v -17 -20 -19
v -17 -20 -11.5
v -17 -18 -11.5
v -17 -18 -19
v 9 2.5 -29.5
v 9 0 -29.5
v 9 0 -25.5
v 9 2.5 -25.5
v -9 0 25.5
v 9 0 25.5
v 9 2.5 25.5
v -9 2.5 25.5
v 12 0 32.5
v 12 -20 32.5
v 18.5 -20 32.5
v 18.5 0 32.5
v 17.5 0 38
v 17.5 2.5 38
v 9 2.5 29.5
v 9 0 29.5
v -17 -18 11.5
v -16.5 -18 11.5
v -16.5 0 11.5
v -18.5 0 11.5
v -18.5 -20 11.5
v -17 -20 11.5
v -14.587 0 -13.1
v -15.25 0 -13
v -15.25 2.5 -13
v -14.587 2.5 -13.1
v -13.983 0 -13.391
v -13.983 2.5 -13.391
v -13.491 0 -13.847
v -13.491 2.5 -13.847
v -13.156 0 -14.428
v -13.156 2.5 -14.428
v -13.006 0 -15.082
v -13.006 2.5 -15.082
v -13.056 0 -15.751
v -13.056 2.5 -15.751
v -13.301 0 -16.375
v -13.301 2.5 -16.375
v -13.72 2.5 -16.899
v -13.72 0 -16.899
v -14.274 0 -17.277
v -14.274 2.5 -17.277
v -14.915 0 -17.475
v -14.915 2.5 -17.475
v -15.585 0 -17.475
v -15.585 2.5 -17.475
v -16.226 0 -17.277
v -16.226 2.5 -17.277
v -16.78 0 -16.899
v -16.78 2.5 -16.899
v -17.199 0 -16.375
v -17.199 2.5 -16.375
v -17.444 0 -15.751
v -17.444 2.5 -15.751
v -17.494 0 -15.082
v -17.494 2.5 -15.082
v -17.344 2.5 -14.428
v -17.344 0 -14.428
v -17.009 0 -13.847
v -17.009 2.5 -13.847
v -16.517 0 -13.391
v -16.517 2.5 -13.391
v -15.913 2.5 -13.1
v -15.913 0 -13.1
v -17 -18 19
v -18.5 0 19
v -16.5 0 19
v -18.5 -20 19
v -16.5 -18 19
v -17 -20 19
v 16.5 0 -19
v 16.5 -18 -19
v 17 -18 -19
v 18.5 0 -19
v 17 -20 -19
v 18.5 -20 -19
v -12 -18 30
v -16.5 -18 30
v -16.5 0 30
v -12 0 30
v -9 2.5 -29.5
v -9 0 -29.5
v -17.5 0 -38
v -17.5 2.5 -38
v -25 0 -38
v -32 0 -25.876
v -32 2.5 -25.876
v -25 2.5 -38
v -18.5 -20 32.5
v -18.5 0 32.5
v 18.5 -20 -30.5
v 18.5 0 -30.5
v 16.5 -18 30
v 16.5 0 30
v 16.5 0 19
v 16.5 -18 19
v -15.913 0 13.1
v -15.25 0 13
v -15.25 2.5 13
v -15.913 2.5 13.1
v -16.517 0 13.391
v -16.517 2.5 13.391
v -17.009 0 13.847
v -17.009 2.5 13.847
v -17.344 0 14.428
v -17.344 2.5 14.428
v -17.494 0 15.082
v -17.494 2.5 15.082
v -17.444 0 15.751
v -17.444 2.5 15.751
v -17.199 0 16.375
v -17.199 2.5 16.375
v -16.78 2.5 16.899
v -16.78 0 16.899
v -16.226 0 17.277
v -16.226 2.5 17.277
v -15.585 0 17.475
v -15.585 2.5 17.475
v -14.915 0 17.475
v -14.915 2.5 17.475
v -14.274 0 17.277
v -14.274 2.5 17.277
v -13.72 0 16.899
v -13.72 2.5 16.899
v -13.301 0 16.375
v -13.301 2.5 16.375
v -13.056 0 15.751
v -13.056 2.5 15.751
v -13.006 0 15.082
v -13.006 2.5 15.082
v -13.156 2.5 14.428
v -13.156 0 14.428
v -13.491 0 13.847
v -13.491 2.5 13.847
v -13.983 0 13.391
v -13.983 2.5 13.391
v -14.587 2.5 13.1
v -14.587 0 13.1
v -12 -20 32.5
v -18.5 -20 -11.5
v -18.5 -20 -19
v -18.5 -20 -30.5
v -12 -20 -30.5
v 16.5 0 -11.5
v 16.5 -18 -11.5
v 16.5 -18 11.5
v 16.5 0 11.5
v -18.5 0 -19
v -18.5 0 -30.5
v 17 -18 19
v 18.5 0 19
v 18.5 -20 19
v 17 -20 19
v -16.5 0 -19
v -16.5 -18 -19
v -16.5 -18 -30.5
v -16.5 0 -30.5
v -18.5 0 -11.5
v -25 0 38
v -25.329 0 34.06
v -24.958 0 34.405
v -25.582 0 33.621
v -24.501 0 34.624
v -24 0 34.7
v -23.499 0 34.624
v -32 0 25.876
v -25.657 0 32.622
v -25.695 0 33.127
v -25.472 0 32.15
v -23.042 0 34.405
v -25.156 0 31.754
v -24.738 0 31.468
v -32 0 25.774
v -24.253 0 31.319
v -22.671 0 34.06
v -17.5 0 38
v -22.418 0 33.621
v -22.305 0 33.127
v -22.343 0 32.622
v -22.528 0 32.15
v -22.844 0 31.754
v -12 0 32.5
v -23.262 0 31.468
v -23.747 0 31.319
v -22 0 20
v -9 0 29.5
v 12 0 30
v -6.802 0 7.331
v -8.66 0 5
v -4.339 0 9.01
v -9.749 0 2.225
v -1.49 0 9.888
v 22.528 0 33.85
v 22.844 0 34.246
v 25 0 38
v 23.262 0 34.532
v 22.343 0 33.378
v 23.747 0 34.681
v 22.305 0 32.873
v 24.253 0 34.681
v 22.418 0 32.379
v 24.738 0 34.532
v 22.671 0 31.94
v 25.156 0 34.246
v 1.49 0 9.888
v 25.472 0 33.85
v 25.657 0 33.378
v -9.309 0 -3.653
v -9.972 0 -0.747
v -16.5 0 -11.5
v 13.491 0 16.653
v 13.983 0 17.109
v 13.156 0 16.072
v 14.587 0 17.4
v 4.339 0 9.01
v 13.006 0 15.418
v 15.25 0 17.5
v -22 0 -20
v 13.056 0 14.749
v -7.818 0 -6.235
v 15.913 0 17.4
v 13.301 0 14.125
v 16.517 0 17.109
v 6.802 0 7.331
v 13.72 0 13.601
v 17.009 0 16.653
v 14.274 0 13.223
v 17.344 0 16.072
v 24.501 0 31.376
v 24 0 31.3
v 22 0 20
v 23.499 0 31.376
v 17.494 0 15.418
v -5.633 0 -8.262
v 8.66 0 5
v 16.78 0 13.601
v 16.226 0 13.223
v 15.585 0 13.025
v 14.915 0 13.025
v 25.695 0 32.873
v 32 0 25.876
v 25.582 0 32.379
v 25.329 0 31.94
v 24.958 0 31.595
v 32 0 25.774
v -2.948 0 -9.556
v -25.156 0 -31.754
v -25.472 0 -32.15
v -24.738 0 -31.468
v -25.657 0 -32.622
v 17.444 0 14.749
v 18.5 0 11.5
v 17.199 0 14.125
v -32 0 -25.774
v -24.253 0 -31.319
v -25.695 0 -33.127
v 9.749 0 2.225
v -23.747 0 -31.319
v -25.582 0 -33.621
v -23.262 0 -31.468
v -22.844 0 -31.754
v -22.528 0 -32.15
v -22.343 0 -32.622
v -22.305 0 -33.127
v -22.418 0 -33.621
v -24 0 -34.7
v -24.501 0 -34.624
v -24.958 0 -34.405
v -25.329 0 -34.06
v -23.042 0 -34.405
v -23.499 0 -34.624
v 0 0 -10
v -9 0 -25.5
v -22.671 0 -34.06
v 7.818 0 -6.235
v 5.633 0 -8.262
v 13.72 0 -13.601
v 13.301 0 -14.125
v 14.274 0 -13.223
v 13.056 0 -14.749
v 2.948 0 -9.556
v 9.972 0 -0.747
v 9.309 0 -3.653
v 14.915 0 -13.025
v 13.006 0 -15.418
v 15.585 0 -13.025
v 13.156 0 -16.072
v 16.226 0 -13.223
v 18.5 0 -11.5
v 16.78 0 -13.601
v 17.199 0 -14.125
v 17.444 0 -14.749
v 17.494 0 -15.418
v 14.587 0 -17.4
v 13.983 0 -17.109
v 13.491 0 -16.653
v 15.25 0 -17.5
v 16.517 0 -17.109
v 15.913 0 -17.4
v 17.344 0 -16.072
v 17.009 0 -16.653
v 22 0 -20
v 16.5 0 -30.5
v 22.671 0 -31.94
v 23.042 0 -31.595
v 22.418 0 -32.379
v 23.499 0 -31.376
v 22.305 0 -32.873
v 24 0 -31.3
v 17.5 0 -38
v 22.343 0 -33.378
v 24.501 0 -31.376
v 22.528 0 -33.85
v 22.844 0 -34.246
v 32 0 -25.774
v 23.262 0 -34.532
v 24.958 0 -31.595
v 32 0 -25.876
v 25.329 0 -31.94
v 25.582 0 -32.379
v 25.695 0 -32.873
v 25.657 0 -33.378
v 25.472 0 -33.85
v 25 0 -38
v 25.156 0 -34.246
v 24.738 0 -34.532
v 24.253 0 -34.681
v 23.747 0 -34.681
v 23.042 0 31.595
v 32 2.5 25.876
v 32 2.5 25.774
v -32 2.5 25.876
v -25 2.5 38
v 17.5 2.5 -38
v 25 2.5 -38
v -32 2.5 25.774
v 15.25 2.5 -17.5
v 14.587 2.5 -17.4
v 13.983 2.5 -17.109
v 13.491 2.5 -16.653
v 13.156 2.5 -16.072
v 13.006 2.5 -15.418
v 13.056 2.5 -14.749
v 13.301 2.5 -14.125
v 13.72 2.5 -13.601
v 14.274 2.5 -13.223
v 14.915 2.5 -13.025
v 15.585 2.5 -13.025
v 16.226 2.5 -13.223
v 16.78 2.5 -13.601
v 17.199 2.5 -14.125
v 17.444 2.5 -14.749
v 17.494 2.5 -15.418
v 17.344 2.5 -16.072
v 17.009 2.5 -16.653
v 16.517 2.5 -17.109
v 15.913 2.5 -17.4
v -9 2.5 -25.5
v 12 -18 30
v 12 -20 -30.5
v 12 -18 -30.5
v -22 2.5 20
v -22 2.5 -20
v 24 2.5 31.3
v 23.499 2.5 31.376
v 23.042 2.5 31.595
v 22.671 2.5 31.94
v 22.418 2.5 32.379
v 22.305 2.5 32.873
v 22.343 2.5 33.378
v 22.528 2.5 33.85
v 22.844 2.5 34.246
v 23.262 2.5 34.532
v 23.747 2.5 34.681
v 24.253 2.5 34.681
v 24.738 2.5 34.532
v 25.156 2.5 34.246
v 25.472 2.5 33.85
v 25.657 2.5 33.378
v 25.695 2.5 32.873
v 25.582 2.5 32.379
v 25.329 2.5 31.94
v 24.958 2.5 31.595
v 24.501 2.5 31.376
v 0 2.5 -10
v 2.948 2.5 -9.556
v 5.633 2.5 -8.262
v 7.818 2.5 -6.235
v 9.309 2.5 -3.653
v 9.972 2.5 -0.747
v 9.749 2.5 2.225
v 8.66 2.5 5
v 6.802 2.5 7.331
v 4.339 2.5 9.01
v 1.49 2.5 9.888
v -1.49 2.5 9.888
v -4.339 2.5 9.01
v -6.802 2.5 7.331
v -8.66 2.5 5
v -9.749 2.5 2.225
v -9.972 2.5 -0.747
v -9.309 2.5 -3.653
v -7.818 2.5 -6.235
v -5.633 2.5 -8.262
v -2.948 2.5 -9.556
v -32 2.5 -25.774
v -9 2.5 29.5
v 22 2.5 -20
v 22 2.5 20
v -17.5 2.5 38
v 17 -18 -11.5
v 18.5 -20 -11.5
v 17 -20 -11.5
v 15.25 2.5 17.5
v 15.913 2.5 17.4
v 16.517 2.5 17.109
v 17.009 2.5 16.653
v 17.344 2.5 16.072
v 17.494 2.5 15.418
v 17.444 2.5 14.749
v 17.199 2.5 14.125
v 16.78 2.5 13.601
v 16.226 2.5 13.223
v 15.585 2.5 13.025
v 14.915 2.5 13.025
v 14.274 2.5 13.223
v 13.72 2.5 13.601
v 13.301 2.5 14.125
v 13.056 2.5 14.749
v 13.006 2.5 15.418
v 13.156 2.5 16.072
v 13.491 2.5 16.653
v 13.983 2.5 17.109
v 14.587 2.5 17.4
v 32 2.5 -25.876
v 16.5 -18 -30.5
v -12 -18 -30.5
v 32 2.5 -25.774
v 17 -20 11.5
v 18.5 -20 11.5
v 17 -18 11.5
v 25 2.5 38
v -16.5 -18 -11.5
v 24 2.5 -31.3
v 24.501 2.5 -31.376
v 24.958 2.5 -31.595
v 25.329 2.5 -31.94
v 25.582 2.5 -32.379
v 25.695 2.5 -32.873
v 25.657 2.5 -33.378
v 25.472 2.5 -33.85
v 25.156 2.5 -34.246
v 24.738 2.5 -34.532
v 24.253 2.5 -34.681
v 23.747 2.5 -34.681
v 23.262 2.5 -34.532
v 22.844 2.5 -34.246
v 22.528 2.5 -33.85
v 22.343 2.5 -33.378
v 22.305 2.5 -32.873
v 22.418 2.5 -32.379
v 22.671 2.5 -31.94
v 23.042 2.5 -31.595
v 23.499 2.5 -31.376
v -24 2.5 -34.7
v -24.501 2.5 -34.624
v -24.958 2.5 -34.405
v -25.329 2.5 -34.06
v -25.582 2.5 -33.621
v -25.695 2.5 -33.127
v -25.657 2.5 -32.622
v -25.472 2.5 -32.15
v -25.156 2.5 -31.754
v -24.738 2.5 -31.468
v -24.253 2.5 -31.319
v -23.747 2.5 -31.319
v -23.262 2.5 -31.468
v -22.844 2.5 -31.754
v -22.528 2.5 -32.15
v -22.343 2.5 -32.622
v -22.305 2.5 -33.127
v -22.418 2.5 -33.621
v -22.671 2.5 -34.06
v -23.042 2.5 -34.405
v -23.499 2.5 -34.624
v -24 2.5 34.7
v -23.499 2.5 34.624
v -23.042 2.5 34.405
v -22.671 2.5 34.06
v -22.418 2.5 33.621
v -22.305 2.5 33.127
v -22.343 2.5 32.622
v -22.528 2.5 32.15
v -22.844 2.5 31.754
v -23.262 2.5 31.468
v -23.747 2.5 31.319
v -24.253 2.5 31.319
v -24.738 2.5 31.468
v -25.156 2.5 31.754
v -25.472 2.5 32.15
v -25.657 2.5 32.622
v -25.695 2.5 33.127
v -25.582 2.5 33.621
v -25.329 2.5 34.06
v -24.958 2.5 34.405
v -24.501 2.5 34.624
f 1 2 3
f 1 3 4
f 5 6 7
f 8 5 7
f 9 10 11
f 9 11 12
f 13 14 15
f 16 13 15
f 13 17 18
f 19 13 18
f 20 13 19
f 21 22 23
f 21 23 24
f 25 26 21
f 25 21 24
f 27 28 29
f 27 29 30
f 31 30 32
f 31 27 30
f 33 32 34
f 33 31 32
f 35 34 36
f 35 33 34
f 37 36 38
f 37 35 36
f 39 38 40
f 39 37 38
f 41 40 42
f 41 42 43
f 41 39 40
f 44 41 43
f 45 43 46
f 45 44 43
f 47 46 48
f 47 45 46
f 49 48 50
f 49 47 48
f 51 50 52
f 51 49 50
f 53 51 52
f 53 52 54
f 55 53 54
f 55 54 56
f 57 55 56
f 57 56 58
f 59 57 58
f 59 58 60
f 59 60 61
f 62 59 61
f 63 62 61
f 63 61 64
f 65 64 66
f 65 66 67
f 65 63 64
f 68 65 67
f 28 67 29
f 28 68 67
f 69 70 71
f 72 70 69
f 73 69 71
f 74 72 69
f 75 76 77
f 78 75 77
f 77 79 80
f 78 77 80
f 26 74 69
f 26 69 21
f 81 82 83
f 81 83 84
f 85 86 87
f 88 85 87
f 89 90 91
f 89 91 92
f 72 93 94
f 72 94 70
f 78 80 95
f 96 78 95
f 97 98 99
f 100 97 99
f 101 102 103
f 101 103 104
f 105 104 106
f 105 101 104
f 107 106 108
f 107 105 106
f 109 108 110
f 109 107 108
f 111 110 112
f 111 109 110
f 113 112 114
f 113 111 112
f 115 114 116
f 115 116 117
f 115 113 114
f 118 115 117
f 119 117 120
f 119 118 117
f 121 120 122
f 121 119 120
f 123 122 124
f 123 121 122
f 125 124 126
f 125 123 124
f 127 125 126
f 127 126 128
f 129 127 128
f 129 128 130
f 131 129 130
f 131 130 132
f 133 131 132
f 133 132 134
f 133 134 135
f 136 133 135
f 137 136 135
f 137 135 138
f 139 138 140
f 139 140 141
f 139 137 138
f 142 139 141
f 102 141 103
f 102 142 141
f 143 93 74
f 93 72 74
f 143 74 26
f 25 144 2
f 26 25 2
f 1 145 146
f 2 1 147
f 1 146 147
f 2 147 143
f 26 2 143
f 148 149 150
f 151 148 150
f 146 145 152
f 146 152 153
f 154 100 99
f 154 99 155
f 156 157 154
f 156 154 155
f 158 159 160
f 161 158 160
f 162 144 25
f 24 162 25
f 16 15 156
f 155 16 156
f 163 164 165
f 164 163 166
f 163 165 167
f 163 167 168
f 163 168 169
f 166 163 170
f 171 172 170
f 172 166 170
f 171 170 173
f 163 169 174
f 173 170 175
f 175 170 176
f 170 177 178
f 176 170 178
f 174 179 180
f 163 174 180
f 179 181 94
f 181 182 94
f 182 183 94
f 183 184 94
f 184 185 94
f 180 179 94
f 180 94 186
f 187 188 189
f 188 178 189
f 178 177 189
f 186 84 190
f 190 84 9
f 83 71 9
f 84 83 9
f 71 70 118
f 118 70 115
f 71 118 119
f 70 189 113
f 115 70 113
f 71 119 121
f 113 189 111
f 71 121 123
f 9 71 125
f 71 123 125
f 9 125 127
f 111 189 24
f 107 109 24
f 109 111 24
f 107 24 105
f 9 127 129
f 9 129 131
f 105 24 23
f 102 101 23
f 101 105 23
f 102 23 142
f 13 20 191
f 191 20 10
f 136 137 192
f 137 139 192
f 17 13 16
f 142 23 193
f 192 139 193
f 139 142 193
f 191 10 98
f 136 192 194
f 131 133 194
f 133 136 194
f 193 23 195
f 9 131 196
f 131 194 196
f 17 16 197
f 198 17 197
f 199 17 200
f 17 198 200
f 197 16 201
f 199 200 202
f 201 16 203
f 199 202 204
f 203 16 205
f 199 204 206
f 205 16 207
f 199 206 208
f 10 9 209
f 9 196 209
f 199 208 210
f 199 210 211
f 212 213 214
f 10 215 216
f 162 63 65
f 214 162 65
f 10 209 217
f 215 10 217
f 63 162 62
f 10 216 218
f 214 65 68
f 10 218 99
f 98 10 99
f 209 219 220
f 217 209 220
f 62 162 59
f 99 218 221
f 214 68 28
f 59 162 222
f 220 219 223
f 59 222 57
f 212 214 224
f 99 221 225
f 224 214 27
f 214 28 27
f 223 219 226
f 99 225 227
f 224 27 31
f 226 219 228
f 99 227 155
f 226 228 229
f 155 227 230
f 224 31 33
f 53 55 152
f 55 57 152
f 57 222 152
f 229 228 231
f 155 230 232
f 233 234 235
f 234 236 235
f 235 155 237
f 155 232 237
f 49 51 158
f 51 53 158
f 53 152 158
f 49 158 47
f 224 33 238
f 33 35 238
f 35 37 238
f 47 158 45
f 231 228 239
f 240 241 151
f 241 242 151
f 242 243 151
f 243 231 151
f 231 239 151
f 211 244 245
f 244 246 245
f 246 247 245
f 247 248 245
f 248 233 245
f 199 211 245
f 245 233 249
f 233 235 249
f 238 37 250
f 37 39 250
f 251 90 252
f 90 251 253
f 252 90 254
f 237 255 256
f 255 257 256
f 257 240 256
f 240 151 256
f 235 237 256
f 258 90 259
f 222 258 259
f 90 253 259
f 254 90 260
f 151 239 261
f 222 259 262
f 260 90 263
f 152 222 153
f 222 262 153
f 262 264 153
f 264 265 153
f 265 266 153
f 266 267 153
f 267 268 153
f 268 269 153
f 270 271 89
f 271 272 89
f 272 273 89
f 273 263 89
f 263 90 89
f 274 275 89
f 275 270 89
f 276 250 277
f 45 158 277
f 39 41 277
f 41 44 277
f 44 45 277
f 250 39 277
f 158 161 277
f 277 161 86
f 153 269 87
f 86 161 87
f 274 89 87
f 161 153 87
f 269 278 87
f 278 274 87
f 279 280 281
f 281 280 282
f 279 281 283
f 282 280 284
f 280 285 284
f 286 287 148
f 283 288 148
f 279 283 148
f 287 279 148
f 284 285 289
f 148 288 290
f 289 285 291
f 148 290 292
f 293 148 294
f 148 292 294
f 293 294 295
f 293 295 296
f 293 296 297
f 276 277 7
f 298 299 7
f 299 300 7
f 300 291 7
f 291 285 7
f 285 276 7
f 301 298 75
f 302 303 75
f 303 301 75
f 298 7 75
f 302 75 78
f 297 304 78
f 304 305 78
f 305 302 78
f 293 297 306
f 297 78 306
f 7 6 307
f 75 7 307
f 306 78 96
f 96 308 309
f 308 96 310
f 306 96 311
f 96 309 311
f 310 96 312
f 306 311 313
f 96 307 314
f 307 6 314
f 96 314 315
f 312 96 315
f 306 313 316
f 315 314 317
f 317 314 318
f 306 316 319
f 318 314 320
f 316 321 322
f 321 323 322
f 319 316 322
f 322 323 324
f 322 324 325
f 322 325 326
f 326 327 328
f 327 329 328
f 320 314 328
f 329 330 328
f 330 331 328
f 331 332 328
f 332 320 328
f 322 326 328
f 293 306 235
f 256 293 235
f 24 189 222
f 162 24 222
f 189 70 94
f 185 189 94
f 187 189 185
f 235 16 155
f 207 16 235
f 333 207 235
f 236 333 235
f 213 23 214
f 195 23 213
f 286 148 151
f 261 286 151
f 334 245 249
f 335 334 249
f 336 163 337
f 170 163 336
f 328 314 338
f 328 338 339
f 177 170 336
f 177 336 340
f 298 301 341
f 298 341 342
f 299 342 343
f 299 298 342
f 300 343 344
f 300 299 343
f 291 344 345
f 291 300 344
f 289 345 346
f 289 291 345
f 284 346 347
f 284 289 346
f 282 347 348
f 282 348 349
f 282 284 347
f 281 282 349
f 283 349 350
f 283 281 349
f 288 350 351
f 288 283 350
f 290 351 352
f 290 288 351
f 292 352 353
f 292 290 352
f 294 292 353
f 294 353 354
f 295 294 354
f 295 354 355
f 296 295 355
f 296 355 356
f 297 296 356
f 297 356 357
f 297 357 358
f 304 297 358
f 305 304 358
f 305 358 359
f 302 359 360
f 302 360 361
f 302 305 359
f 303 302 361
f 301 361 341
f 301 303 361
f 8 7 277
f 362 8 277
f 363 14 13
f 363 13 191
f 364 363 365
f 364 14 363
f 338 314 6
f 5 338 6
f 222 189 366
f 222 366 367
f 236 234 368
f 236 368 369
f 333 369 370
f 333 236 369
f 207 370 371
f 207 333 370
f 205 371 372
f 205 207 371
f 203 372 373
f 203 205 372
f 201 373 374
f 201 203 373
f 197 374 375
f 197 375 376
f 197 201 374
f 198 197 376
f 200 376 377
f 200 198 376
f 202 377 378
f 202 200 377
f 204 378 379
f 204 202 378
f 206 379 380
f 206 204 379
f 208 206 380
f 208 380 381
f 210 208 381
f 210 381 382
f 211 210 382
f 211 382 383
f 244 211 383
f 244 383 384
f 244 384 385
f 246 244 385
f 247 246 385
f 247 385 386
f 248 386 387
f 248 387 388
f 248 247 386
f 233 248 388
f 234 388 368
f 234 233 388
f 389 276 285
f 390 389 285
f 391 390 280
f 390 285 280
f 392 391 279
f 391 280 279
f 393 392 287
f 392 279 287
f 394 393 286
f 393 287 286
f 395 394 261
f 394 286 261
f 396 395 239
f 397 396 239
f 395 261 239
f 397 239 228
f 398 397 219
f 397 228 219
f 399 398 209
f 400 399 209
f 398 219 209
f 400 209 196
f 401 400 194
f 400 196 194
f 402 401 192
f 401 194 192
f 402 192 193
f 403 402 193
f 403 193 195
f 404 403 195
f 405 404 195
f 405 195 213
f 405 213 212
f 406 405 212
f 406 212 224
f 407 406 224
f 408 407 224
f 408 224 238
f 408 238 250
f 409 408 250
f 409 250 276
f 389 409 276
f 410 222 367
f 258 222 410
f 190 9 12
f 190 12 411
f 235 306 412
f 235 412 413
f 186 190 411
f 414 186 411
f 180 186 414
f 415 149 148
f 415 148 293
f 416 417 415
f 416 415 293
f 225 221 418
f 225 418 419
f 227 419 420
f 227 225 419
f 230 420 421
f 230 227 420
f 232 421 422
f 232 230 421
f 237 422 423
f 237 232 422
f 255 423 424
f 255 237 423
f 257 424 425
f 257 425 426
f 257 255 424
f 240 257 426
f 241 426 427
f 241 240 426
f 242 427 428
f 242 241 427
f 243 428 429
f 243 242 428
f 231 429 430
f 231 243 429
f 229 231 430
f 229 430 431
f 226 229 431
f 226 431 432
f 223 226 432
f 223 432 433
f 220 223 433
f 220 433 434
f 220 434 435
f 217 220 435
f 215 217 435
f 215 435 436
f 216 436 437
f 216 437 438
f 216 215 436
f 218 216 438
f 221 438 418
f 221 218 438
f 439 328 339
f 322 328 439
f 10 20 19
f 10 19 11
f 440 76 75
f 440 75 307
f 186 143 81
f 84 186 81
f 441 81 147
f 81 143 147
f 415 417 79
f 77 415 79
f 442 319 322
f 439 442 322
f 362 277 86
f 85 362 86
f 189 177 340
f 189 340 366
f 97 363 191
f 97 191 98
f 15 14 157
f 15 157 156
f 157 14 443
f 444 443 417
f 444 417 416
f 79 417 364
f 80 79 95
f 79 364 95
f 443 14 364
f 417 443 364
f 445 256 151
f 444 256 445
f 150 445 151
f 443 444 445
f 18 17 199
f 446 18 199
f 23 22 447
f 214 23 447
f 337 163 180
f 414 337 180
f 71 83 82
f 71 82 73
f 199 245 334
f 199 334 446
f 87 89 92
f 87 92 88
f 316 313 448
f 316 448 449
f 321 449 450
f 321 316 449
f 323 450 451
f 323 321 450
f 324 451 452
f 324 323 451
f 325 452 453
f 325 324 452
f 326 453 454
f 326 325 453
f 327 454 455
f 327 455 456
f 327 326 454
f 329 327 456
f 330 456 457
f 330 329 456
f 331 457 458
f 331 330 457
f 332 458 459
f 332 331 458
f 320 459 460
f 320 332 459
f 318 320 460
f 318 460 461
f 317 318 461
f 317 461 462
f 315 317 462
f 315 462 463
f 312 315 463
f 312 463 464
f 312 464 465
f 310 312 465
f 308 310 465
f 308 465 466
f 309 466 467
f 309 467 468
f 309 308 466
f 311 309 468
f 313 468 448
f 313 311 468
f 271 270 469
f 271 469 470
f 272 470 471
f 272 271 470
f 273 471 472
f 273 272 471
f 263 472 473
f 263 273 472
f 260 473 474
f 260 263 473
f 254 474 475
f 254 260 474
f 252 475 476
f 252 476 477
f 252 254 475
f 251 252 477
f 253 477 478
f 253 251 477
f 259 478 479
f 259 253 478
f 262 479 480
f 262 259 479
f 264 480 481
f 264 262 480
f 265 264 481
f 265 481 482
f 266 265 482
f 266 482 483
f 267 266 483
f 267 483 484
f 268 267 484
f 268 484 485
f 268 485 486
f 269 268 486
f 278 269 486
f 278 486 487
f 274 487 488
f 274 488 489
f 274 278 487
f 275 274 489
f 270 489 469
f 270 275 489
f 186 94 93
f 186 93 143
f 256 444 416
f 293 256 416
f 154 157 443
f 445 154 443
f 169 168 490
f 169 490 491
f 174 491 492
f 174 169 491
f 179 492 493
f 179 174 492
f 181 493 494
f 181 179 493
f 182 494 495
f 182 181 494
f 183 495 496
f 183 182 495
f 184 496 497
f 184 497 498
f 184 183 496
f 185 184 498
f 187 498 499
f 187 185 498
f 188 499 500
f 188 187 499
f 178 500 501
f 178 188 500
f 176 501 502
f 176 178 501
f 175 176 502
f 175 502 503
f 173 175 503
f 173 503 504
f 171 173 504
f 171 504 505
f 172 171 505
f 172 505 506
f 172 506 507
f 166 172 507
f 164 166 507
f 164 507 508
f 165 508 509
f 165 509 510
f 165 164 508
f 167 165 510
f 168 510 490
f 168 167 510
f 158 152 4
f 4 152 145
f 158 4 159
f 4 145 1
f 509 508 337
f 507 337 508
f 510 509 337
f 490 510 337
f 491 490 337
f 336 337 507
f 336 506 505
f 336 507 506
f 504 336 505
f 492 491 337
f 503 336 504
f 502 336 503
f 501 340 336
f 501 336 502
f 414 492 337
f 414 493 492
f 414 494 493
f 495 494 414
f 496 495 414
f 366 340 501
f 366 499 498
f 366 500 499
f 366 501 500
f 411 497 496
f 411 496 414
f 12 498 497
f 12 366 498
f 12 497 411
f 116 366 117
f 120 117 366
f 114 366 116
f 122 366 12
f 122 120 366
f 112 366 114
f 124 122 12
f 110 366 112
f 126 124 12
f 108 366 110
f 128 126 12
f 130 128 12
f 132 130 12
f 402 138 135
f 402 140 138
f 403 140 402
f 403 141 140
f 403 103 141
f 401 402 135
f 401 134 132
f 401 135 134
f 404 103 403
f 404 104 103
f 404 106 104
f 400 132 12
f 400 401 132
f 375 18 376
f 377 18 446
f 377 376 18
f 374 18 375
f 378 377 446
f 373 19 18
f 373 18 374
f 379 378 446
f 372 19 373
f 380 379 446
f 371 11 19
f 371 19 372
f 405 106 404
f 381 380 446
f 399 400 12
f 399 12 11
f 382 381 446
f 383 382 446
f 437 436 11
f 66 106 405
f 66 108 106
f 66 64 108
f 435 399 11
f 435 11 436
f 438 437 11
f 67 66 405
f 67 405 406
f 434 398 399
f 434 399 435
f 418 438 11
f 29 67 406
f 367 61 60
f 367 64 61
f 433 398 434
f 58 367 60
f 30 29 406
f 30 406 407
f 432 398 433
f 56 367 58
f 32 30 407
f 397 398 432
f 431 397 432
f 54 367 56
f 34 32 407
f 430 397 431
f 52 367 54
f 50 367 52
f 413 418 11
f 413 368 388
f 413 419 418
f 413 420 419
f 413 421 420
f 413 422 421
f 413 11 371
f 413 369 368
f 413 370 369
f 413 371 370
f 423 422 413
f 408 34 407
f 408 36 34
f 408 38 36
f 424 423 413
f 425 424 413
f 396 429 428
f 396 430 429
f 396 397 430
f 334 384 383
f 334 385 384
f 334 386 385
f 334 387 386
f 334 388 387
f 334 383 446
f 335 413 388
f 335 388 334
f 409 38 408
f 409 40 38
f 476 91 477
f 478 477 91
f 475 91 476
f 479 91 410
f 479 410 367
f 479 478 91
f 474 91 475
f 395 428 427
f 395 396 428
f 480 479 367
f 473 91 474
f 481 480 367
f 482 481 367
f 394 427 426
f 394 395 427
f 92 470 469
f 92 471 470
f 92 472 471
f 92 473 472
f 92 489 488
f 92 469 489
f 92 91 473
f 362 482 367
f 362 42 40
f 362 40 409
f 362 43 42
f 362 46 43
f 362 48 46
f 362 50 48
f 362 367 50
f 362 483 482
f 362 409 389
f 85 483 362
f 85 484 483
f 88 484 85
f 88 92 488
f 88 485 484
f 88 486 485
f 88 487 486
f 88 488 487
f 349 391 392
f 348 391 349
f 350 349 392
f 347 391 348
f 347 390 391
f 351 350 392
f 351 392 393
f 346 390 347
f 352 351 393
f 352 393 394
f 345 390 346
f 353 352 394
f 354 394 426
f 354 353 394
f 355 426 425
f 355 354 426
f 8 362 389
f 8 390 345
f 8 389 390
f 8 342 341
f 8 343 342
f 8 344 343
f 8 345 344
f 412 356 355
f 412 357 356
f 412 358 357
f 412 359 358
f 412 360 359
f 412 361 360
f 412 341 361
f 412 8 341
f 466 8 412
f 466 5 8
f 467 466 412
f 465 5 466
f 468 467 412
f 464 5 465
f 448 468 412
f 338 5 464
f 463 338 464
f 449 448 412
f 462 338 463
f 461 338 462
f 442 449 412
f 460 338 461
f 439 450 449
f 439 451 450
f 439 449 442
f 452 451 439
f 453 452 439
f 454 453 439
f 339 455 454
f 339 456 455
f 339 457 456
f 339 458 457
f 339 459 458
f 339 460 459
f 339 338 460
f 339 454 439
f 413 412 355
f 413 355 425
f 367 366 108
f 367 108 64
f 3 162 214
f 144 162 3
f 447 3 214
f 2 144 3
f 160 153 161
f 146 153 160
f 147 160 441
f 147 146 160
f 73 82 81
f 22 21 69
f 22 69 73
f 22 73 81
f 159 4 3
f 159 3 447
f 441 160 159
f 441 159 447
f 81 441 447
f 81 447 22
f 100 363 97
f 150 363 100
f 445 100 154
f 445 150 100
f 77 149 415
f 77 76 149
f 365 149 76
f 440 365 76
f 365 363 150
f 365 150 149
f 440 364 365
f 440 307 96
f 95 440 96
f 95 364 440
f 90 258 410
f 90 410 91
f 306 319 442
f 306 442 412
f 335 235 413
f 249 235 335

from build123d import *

# Parameters (mm, degrees)
SKETCH_1_W          = 64
SKETCH_1_H          = 76
SKETCH_1_R          = 2.25
SKETCH_1_R_2        = 1.7
EXTRUDE_1_DEPTH     = 2.5
EXTRUDE_START       = -20
SKETCH_2_W          = 5
SKETCH_2_H          = 61
EXTRUDE_2_DEPTH     = 2
EXTRUDE_2_2_DEPTH   = 2
SKETCH_3_W          = 2
SKETCH_3_H          = 11.5
EXTRUDE_3_DEPTH     = 20
SKETCH_4_W          = 6.5
SKETCH_4_H          = 2.5
EXTRUDE_4_DEPTH     = 20
SKETCH_5_R          = 10
CUT_EXTRUDE_1_DEPTH = 10


with BuildPart() as part:
    # 草图1 → 凸台-拉伸1 (new body)
    with BuildSketch(Plane(origin=(0, 0, 0), x_dir=(1, 0, 0), z_dir=(0, 1, 0))):
        Rectangle(SKETCH_1_W, SKETCH_1_H)
        with Locations(Location((-15.25, 15.25, 0), (0, 0, 270))):
            Circle(SKETCH_1_R, mode=Mode.SUBTRACT)
        with Locations(Location((-24, -33, 0), (0, 0, 270))):
            Circle(SKETCH_1_R_2, mode=Mode.SUBTRACT)
        with Locations(Location((24, -33, 0), (0, 0, 90))):
            Circle(SKETCH_1_R_2, mode=Mode.SUBTRACT)
        with Locations(Location((24, 33, 0), (0, 0, 270))):
            Circle(SKETCH_1_R_2, mode=Mode.SUBTRACT)
        with Locations(Location((-24, 33, 0), (0, 0, 90))):
            Circle(SKETCH_1_R_2, mode=Mode.SUBTRACT)
        with Locations(Location((15.25, 15.25, 0), (0, 0, 90))):
            Circle(SKETCH_1_R, mode=Mode.SUBTRACT)
        with Locations(Location((15.25, -15.25, 0), (0, 0, 270))):
            Circle(SKETCH_1_R, mode=Mode.SUBTRACT)
        with Locations(Location((-15.25, -15.25, 0), (0, 0, 90))):
            Circle(SKETCH_1_R, mode=Mode.SUBTRACT)
    extrude(amount=EXTRUDE_1_DEPTH)



with BuildPart() as body_2:
    # 草图2 → 凸台-拉伸2 (new body)
    with BuildSketch(Plane(origin=(0, 0, 0), x_dir=(1, 0, 0), z_dir=(0, 1, 0)).offset(EXTRUDE_START)):
        with Locations((14.5, 0)):
            Rectangle(SKETCH_2_W, SKETCH_2_H)
    extrude(amount=EXTRUDE_2_DEPTH)


with BuildPart() as body_3:
    # 草图2 → Extrude 2 2 (new body)
    with BuildSketch(Plane(origin=(0, 0, 0), x_dir=(1, 0, 0), z_dir=(0, 1, 0)).offset(EXTRUDE_START)):
        with Locations((-14.5, 0)):
            Rectangle(SKETCH_2_W, SKETCH_2_H)
    extrude(amount=EXTRUDE_2_2_DEPTH)


with BuildPart() as part_1:
    add(part.part)

    add(body_2.part)  # 凸台-拉伸3 merges body 2

    add(body_3.part)  # 凸台-拉伸3 merges body 3
    # 草图3 → 凸台-拉伸3 (add)
    with BuildSketch(Plane(origin=(0, 0, 0), x_dir=(1, 0, 0), z_dir=(0, 1, 0)).offset(EXTRUDE_START)):
        with Locations((17.5, -24.75)):
            Rectangle(SKETCH_3_W, SKETCH_3_H)
        with Locations((-17.5, -24.75)):
            Rectangle(SKETCH_3_W, SKETCH_3_H)
        Polygon((16.5, -1), (16.5, 11.5), (18.5, 11.5), (18.5, -1), (18.5, -11.5), (16.5, -11.5), align=None)
        with Locations((17.5, 24.75)):
            Rectangle(SKETCH_3_W, SKETCH_3_H)
        Polygon((-18.5, -1), (-18.5, 11.5), (-16.5, 11.5), (-16.5, -1), (-16.5, -11.5), (-18.5, -11.5), align=None)
        with Locations((-17.5, 24.75)):
            Rectangle(SKETCH_3_W, SKETCH_3_H)
    extrude(amount=EXTRUDE_3_DEPTH)

    # 草图4 → 凸台-拉伸4 (add)
    with BuildSketch(Plane(origin=(0, 0, 0), x_dir=(1, 0, 0), z_dir=(0, 1, 0)).offset(EXTRUDE_START)):
        with Locations((-15.25, -31.25)):
            Rectangle(SKETCH_4_W, SKETCH_4_H)
        with Locations((15.25, -31.25)):
            Rectangle(SKETCH_4_W, SKETCH_4_H)
    extrude(amount=EXTRUDE_4_DEPTH)

    # 草图5 → 切除-拉伸1 (cut)
    with BuildSketch(Plane.XZ):
        with Locations(Location((0, 0, 0), (0, 0, 270))):
            Circle(SKETCH_5_R)
        Polygon((-22, 20), (-22, -20), (-32, -25.773502692), (-32, 25.773502692), align=None)
        Polygon((22, 20), (32, 25.773502692), (32, -25.773502692), (22, -20), align=None)
        Polygon((-17.5, 38), (17.5, 38), (9, 29.5), (9, 25.5), (-9, 25.5), (-9, 29.5), align=None)
        Polygon((-32, -25.875644347), (-25, -38), (-32, -38), align=None)
        Polygon((32, -25.875644347), (32, -38), (25, -38), align=None)
        Polygon((32, 25.875644347), (25, 38), (32, 38), align=None)
        Polygon((-32, 25.875644347), (-32, 38), (-25, 38), align=None)
        Polygon((17.5, -38), (9, -29.5), (9, -25.5), (-9, -25.5), (-9, -29.5), (-17.5, -38), align=None)
    extrude(amount=-CUT_EXTRUDE_1_DEPTH, mode=Mode.SUBTRACT)


solid = part_1.part
